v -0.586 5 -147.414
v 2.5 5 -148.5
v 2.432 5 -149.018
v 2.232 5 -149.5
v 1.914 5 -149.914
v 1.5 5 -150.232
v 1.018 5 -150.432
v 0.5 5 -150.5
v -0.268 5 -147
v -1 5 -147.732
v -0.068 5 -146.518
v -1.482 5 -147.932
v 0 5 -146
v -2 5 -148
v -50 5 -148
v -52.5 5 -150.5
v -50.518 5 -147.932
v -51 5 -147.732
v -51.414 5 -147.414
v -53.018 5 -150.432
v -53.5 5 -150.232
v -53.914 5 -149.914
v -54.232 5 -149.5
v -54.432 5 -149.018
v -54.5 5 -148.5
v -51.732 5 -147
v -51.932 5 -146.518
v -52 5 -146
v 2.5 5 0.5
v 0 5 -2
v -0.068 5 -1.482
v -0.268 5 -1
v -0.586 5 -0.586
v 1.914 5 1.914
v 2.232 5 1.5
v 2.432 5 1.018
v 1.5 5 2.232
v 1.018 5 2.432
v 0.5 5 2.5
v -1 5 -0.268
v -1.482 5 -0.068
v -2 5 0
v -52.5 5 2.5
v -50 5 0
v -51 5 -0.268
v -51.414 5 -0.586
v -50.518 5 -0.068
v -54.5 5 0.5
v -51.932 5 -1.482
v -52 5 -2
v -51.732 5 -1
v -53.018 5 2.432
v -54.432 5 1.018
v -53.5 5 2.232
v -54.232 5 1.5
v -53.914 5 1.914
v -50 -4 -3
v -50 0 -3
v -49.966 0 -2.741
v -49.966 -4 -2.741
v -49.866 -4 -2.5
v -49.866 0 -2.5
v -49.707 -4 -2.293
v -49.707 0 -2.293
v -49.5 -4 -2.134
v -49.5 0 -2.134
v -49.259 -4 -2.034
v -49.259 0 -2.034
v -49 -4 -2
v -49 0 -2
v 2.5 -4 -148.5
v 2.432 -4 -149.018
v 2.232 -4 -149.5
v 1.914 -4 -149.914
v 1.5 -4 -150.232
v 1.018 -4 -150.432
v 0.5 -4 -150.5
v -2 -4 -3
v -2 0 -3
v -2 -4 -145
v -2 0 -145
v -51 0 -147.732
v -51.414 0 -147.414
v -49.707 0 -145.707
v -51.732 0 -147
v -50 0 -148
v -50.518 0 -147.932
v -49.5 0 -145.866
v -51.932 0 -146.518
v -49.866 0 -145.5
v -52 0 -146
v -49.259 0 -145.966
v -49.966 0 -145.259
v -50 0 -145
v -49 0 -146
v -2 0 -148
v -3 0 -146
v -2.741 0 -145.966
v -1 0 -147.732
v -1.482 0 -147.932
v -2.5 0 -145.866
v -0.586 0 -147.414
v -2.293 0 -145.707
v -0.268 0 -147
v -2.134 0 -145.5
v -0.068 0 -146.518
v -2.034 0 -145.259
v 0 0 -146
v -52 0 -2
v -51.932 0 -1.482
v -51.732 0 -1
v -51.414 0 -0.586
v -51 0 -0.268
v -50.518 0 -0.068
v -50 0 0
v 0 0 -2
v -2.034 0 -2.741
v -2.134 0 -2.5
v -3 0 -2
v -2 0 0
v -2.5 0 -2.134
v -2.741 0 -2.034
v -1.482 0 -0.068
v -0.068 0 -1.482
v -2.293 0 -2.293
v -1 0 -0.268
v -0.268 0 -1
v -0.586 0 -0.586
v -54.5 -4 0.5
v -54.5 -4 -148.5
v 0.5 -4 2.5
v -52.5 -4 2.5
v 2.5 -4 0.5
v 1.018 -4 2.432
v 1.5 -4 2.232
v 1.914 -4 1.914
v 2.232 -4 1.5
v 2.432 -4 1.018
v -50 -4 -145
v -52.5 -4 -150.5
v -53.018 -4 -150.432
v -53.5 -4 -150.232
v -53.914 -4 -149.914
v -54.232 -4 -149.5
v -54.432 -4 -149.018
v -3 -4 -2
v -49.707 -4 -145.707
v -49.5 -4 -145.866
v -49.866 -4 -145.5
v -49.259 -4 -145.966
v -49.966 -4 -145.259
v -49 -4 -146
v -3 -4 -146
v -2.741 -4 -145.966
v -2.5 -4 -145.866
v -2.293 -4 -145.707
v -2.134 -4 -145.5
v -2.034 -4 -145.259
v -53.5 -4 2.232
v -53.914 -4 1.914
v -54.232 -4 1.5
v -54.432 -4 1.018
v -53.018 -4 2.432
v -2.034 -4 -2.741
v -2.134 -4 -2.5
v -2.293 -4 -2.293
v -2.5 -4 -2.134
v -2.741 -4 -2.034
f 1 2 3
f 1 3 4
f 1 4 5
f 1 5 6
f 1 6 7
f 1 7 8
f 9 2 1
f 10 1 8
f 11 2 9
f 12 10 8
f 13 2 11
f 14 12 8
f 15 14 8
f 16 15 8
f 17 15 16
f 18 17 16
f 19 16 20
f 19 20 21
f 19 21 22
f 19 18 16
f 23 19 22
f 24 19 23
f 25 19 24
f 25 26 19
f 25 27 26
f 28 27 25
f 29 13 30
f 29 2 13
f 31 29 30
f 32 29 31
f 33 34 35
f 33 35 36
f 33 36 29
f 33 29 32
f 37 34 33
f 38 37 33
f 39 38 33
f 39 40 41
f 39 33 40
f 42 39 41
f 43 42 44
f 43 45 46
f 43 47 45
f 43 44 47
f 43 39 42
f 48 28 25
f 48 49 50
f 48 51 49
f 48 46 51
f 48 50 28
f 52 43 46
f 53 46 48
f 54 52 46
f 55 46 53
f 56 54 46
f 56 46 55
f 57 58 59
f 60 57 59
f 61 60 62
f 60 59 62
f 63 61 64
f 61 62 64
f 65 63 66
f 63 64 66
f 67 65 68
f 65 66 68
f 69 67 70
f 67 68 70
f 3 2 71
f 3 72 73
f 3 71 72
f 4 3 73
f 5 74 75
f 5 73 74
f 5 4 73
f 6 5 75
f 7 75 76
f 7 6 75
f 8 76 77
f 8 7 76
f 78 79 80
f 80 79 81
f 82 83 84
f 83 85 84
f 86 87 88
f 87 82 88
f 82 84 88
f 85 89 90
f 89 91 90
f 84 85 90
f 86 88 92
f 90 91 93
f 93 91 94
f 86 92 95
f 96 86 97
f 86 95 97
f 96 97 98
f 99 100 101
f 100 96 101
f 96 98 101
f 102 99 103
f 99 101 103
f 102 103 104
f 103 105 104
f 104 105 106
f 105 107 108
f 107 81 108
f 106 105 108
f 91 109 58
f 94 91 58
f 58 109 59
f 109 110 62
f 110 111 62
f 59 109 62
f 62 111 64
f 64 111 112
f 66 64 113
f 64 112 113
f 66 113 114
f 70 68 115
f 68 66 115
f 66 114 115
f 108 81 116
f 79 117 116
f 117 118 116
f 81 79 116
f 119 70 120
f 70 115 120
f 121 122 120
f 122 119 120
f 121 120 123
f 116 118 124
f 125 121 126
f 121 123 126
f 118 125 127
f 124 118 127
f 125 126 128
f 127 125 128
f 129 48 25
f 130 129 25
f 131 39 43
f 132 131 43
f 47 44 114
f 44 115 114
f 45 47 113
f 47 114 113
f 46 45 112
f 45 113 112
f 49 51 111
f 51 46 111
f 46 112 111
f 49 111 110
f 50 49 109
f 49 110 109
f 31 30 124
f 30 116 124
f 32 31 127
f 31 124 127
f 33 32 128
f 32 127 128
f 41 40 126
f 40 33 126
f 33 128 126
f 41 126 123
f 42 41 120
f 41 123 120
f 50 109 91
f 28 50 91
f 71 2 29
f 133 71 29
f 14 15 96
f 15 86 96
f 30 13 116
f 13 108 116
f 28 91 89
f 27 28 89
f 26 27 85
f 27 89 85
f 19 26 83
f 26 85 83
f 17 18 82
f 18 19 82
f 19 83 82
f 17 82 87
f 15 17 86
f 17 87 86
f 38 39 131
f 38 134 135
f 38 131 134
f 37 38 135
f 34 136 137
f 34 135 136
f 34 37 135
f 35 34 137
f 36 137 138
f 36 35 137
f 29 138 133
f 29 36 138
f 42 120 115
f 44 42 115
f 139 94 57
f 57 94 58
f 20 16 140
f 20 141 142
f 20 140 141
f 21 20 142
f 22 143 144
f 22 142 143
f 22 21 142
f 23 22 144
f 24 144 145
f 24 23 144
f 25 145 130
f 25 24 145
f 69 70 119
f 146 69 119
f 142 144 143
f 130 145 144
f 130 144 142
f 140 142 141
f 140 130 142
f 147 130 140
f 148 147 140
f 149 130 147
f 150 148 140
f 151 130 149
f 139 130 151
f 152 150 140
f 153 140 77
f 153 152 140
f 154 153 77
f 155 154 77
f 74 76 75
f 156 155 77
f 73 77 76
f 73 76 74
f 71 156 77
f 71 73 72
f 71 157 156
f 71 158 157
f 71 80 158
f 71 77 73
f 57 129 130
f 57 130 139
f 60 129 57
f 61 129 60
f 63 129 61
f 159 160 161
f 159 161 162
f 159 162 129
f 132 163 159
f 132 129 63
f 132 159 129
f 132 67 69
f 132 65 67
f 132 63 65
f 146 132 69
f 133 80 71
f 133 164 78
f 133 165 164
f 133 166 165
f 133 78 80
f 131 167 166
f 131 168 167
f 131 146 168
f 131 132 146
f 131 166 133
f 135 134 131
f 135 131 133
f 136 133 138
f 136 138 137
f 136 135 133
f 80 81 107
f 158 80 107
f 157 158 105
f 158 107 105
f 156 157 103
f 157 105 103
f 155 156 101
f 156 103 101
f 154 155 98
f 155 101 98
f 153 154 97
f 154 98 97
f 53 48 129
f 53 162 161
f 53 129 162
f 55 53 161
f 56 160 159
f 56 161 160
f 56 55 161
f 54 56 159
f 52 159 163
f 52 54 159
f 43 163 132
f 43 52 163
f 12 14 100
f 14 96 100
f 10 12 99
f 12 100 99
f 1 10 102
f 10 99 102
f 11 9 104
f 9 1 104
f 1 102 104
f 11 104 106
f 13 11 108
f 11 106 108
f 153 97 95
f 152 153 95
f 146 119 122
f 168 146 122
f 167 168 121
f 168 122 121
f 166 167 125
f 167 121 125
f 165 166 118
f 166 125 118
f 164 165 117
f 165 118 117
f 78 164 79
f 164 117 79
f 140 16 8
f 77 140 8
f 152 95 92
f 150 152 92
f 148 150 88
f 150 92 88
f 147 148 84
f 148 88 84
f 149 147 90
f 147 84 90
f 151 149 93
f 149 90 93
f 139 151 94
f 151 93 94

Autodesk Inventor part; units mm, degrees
ref_plane "YZ Plane" through (0, 0, 0) normal (1, 0, 0) x (0, 1, 0)
ref_plane "XZ Plane" through (0, 0, 0) normal (0, 1, 0) x (-1, 0, 0)
ref_plane "XY Plane" through (0, 0, 0) normal (0, 0, 1) x (1, 0, 0)
sketch "Sketch1" plane through (0, 0, 0) normal (0, 1, 0) x (-1, 0, 0)
  line L0 (2, 0) -> (50, 0)
  line L1 (52, -2) -> (52, -146)
  line L2 (50, -148) -> (2, -148)
  line L3 (0, -146) -> (0, -2)
  arc A0 (52, -2) -> (50, 0) centre (50, -2) ccw
  arc A1 (0, -146) -> (2, -148) centre (2, -146) ccw
  arc A2 (50, -148) -> (52, -146) centre (50, -146) ccw
  arc A3 (2, 0) -> (0, -2) centre (2, -2) ccw
  line L4 (52.5, 2.5) -> (-0.5, 2.5)
  line L5 (-2.5, 0.5) -> (-2.5, -148.5)
  line L6 (-0.5, -150.5) -> (52.5, -150.5)
  line L7 (54.5, -148.5) -> (54.5, 0.5)
  arc A4 (54.5, 0.5) -> (52.5, 2.5) centre (52.5, 0.5) ccw
  arc A5 (-0.5, 2.5) -> (-2.5, 0.5) centre (-0.5, 0.5) ccw
  arc A6 (-2.5, -148.5) -> (-0.5, -150.5) centre (-0.5, -148.5) ccw
  arc A7 (52.5, -150.5) -> (54.5, -148.5) centre (52.5, -148.5) ccw
  point P0 (0, 0)
  point P1 (52, -148)
  point P2 (52, 0)
  point P3 (0, -148)
  dimension "d0" = 52
  dimension "d1" = 148
  dimension "d2" = 2
  dimension "d3" = 2.5
  dimension "d4" = 2.5
  dimension "d5" = 2.5
  dimension "d6" = 2.5
  dimension "d7" = 2
extrude "Extrusion1" add sketch "Sketch1" along normal blind 5
sketch "Sketch2" plane through (0, 0, 0) normal (0, -1, 0) x (1, 0, 0)
  arc A0 (2.5, 0.5) -> (0.5, 2.5) centre (0.5, 0.5) ccw projected
  line L0 (-52.5, 2.5) -> (0.5, 2.5) projected
  arc A1 (-52.5, 2.5) -> (-54.5, 0.5) centre (-52.5, 0.5) ccw projected
  line L1 (-54.5, -148.5) -> (-54.5, 0.5) projected
  arc A2 (-54.5, -148.5) -> (-52.5, -150.5) centre (-52.5, -148.5) ccw projected
  line L2 (0.5, -150.5) -> (-52.5, -150.5) projected
  arc A3 (0.5, -150.5) -> (2.5, -148.5) centre (0.5, -148.5) ccw projected
  line L3 (2.5, 0.5) -> (2.5, -148.5) projected
  line L4 (0, -146) -> (0, -2) projected
  arc A4 (-2, -148) -> (0, -146) centre (-2, -146) ccw projected
  line L5 (-50, -148) -> (-2, -148) projected
  arc A5 (-52, -146) -> (-50, -148) centre (-50, -146) ccw projected
  line L6 (-52, -2) -> (-52, -146) projected
  arc A6 (-50, 0) -> (-52, -2) centre (-50, -2) ccw projected
  line L7 (-2, 0) -> (-50, 0) projected
  arc A7 (0, -2) -> (-2, 0) centre (-2, -2) ccw projected
  line L8 (-49, -146) -> (-3, -146)
  line L9 (-2, -145) -> (-2, -3)
  line L10 (-3, -2) -> (-49, -2)
  line L11 (-50, -3) -> (-50, -145)
  arc A8 (-3, -146) -> (-2, -145) centre (-3, -145) ccw
  arc A9 (-50, -145) -> (-49, -146) centre (-49, -145) ccw
  arc A10 (-49, -2) -> (-50, -3) centre (-49, -3) ccw
  arc A11 (-2, -3) -> (-3, -2) centre (-3, -3) ccw
  point P0 (0, 0)
  dimension "d10" = 1
extrude "Extrusion2" add sketch "Sketch2" along normal blind 2 contours L3 A3 L2 A2 L1 A1 L0 A0 | A4 L5 A5 L6 A6 L7 A7 L4
sketch "Sketch3" plane through (0, -2, 0) normal (0, -1, 0) x (1, 0, 0)
  line L0 (2.5, -148.5) -> (2.5, 0.5) projected
  arc A0 (2.5, 0.5) -> (0.5, 2.5) centre (0.5, 0.5) ccw projected
  line L1 (0.5, 2.5) -> (-52.5, 2.5) projected
  arc A1 (-52.5, 2.5) -> (-54.5, 0.5) centre (-52.5, 0.5) ccw projected
  line L2 (-54.5, 0.5) -> (-54.5, -148.5) projected
  arc A2 (-54.5, -148.5) -> (-52.5, -150.5) centre (-52.5, -148.5) ccw projected
  line L3 (-52.5, -150.5) -> (0.5, -150.5) projected
  arc A3 (0.5, -150.5) -> (2.5, -148.5) centre (0.5, -148.5) ccw projected
  arc A4 (-50, -145) -> (-49, -146) centre (-49, -145) ccw projected
  line L4 (-50, -145) -> (-50, -3) projected
  arc A5 (-49, -2) -> (-50, -3) centre (-49, -3) ccw projected
  line L5 (-49, -2) -> (-3, -2) projected
  arc A6 (-2, -3) -> (-3, -2) centre (-3, -3) ccw projected
  line L6 (-2, -3) -> (-2, -145) projected
  arc A7 (-3, -146) -> (-2, -145) centre (-3, -145) ccw projected
  line L7 (-3, -146) -> (-49, -146) projected
  point P0 (0, 0)
extrude "Extrusion3" add sketch "Sketch3" along normal blind 2
sketch "Sketch4" plane through (0.5, 5, -150.5) normal (0, 0, -1) x (-1, 0, 0)
  line L0 (-2, -9) -> (-2, 0) projected
  line L1 (-2, -9) -> (53.9521, -19.876)
  line L2 (-2, -9) -> (54.9993, -9) construction
  line L3 (55, -9) -> (55, 0) projected
  line L4 (53.9521, -19.876) -> (55, -9)
  line L5 (55, 0) -> (53, 0) projected
  line L6 (55, 0) -> (53.1086, -19.712)
  point P0 (0.5, -5)
  dimension "d15" = 11
  dimension "d16" = 9
properties part number "hole size and stack size"
